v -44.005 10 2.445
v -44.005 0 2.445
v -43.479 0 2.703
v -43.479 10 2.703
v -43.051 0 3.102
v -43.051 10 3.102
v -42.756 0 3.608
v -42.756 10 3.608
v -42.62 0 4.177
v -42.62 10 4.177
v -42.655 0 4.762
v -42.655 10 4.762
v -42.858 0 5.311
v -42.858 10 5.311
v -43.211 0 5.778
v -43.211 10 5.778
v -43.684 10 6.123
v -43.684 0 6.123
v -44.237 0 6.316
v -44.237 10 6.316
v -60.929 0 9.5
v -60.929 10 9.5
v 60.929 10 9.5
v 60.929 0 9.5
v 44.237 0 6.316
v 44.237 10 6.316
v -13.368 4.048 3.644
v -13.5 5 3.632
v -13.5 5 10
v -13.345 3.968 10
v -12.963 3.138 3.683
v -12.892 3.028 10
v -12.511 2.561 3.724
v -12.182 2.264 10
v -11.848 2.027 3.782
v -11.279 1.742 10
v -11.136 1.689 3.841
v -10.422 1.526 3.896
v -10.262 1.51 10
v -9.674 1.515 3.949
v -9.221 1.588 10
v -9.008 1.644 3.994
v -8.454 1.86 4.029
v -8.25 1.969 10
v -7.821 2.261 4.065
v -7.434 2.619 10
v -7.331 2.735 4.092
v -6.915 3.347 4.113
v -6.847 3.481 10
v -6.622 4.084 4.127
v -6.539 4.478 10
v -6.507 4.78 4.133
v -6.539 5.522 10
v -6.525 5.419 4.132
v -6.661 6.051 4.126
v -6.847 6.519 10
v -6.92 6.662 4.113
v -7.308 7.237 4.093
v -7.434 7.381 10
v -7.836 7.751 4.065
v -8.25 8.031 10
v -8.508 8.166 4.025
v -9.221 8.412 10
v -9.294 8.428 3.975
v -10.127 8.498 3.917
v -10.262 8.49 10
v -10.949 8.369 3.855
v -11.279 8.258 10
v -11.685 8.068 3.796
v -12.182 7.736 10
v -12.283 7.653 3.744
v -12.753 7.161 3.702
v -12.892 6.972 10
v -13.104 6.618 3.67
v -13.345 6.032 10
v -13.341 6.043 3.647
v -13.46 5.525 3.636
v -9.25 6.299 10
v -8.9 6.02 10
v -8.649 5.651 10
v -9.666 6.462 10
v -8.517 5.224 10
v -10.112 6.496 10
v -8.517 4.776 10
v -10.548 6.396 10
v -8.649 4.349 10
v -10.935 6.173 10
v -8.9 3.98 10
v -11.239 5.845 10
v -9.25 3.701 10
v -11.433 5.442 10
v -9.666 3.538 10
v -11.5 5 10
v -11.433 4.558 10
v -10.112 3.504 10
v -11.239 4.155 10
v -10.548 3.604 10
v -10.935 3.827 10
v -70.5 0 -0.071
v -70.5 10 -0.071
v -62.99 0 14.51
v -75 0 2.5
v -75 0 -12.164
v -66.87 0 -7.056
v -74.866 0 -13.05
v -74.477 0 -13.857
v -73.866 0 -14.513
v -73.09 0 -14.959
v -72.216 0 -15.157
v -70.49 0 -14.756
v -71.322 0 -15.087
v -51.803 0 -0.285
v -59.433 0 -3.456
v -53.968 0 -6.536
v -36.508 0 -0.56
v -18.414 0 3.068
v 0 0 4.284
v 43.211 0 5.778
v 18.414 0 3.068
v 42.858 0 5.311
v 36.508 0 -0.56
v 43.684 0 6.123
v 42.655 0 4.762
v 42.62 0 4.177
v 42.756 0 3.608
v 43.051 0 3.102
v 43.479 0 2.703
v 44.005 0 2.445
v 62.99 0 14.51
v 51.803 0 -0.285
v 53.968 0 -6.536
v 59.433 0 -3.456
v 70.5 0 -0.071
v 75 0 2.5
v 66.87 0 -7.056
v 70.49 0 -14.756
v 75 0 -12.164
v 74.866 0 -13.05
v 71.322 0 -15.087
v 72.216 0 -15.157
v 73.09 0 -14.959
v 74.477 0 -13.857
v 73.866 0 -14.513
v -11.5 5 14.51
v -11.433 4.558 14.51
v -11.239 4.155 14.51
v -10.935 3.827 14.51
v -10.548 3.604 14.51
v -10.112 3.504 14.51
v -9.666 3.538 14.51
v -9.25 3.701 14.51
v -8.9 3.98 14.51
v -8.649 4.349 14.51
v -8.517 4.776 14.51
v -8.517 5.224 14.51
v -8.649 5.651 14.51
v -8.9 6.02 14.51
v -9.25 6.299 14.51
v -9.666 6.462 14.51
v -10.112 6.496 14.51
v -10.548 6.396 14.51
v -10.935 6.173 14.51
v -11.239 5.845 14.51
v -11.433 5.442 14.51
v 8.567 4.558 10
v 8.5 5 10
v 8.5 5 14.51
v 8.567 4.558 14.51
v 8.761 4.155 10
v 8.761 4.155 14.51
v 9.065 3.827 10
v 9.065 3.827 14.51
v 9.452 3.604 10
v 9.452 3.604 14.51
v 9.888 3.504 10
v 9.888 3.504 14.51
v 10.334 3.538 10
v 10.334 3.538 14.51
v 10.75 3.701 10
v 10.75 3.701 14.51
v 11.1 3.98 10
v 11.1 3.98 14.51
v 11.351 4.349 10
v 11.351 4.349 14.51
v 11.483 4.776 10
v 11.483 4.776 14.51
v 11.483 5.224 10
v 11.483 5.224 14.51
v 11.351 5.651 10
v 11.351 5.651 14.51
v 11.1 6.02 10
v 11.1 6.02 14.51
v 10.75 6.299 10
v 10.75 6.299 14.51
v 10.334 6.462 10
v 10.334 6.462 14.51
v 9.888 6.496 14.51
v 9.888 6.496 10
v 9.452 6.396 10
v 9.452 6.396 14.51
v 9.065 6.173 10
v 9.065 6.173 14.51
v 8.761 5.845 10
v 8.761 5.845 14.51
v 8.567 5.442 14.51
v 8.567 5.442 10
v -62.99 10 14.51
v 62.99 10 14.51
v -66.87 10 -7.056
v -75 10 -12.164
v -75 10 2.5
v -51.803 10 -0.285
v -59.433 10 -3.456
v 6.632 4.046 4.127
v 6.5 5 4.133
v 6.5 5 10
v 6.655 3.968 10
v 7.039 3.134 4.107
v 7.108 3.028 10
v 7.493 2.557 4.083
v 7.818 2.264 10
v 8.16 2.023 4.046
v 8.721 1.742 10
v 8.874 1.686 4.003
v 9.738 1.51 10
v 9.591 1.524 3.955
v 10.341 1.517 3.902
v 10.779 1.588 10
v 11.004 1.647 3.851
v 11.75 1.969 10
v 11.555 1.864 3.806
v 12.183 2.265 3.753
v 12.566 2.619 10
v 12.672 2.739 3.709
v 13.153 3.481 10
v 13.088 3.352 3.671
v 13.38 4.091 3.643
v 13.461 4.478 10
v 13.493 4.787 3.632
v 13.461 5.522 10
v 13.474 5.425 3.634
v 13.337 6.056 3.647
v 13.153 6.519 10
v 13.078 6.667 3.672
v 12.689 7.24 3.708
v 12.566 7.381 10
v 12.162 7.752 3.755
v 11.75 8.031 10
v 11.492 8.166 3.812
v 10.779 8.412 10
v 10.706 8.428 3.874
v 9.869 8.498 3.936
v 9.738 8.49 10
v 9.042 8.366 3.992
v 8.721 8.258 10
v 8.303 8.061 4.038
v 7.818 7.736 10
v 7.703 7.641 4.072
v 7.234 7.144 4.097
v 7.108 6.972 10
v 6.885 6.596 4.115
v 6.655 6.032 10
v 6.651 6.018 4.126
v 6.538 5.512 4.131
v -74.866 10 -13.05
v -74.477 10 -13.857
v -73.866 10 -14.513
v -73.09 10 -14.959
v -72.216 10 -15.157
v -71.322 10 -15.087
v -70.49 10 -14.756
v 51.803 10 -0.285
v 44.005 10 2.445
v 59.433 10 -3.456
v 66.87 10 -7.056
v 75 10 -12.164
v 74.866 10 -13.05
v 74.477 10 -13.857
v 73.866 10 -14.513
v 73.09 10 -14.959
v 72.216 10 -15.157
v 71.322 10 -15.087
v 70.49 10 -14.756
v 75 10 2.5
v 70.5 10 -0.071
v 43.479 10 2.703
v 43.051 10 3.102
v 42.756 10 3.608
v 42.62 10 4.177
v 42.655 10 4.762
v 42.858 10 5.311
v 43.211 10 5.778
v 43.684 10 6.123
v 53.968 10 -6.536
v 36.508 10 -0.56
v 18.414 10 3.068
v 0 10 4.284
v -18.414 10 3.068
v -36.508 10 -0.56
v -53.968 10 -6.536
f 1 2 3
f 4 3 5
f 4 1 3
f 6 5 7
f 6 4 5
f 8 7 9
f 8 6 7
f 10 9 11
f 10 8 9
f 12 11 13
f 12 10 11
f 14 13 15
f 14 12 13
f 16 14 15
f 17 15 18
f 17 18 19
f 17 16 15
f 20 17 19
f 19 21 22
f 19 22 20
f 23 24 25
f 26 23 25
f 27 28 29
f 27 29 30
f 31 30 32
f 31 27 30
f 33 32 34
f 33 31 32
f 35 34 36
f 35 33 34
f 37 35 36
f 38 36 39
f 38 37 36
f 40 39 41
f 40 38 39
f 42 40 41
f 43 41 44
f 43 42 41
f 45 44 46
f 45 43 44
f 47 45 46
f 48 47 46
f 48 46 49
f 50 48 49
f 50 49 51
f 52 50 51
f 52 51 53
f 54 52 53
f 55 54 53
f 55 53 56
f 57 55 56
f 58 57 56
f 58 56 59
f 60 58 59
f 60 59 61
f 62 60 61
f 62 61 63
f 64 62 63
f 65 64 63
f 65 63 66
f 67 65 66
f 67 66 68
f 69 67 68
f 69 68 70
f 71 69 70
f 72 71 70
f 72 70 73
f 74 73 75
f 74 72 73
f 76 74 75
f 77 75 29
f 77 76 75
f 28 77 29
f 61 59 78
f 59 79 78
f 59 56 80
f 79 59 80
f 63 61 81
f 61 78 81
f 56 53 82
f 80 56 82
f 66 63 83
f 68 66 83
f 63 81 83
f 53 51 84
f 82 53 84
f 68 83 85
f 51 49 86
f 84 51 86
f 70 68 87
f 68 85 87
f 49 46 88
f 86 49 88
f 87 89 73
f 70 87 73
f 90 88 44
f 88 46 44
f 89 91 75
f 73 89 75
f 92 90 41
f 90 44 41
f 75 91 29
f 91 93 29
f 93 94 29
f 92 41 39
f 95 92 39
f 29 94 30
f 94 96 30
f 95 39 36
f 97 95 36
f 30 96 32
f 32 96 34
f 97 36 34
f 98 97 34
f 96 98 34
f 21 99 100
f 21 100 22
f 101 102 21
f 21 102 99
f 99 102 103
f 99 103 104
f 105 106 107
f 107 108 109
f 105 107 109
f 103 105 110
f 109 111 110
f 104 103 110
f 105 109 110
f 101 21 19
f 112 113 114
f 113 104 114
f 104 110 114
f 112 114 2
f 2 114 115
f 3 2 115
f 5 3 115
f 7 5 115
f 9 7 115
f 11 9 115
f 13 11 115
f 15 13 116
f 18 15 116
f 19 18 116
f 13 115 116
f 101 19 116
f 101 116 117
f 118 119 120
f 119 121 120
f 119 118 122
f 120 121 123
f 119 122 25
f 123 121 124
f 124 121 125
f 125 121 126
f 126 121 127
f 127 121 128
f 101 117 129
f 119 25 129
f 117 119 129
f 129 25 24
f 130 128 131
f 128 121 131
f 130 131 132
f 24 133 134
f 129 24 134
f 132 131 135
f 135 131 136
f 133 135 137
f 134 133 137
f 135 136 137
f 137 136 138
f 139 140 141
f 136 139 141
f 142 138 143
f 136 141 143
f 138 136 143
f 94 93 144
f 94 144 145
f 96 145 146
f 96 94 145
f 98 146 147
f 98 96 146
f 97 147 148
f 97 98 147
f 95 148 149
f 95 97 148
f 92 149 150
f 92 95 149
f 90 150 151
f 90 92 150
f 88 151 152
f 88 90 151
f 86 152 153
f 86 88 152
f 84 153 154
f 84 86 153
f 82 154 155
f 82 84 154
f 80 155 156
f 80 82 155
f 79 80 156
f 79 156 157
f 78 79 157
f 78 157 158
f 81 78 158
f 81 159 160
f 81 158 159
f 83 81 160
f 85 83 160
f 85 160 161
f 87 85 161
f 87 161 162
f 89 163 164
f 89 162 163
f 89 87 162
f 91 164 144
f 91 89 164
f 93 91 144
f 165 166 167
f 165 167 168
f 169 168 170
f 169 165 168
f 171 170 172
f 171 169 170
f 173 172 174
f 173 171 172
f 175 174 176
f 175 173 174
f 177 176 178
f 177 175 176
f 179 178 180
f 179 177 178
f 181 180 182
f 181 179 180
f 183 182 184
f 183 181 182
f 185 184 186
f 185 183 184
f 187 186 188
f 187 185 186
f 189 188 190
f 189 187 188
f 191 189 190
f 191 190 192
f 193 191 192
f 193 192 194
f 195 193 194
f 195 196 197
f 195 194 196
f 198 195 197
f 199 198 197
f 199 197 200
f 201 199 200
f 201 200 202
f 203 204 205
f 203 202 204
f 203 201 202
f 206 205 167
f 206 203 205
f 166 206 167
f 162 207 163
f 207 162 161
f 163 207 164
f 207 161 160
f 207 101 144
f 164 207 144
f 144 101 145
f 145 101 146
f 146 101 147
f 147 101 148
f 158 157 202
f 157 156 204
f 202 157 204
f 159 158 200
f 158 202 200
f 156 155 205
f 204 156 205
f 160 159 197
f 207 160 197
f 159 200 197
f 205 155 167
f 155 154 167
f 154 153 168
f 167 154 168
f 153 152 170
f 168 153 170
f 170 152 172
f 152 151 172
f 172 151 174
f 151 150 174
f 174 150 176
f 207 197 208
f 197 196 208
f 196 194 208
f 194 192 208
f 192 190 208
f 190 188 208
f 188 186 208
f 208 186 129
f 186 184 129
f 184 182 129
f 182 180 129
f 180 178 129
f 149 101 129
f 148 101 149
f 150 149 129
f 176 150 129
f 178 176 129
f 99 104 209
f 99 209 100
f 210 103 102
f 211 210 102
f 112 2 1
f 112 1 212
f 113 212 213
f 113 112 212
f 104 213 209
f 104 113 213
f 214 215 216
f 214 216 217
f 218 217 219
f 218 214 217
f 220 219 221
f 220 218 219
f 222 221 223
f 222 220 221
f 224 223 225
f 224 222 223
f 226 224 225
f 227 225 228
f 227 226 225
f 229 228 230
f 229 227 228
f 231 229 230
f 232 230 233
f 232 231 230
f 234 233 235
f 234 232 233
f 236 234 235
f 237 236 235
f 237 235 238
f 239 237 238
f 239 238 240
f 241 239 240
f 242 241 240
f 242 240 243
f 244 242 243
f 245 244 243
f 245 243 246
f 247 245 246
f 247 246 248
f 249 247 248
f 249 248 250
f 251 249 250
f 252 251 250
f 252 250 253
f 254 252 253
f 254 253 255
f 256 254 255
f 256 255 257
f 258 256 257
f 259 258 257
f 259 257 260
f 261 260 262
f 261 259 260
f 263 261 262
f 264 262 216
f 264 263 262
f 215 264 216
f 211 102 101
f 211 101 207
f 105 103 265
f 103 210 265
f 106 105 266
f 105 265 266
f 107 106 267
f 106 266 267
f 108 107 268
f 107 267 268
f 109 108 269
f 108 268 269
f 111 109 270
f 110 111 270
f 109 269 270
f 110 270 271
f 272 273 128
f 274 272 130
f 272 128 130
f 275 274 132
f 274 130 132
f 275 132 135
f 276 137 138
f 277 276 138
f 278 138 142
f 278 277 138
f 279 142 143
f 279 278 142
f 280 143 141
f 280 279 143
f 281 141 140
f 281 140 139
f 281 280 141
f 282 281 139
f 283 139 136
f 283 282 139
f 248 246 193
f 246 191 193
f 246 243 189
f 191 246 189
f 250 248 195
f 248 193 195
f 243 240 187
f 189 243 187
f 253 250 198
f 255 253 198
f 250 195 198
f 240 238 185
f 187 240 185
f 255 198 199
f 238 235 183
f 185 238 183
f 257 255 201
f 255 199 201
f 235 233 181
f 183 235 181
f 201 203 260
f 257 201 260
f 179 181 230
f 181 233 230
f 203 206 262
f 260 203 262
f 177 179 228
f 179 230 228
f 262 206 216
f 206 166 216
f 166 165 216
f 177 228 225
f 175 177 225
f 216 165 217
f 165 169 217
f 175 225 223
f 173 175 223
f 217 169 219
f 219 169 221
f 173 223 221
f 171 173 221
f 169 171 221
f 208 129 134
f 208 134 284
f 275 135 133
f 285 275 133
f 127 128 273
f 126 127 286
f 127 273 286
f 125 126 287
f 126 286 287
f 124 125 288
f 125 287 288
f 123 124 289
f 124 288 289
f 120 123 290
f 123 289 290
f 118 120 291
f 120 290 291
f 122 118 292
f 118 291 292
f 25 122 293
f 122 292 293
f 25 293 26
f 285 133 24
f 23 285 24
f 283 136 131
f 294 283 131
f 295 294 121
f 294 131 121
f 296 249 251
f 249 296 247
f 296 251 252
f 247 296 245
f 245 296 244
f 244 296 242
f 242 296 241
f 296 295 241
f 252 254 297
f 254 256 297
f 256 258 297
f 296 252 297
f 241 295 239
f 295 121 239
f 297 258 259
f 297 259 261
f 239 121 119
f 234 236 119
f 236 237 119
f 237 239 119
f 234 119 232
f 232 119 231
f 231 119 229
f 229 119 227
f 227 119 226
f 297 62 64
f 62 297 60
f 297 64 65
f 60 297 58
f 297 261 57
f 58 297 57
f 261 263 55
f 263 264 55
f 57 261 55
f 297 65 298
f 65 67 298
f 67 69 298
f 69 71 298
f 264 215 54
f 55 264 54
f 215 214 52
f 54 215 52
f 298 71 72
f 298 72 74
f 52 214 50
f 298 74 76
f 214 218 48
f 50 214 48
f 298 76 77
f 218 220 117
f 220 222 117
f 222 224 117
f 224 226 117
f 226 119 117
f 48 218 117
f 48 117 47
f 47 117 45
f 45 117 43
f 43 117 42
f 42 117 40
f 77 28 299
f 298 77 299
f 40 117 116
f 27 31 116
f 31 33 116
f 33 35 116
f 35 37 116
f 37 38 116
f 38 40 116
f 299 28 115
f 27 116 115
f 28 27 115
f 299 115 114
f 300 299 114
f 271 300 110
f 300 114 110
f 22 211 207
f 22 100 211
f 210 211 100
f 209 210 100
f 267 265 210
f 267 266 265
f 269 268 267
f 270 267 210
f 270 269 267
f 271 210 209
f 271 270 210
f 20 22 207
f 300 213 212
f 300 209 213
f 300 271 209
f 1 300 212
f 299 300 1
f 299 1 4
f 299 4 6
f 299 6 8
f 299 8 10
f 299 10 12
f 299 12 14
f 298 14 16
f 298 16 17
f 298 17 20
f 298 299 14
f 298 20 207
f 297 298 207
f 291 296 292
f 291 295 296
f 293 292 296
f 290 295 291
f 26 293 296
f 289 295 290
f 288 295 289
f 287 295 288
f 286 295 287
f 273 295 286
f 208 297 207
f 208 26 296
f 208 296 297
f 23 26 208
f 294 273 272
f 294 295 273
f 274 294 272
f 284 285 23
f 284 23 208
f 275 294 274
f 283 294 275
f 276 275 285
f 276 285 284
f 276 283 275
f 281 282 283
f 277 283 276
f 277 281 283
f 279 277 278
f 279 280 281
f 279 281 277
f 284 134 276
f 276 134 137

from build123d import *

# Parameters (mm, degrees)
EXTRUDE_1_DEPTH     = 10
CHAMFER_1_SIZE      = 15
FILLET_1_R          = 3
SKETCH_2_R          = 1.5
CUT_EXTRUDE_2_DEPTH = 78.661122835
SKETCH_4_R          = 3.5
CUT_EXTRUDE_3_DEPTH = 10
CUT_EXTRUDE_4_DEPTH = 78.661122848
FILLET_2_R          = 2
SKETCH_6_W          = 150
SKETCH_6_H          = 5.98
CUT_EXTRUDE_5_DEPTH = 78.661122848


with BuildPart() as part:
    # 草图1 → 凸台-拉伸1 (new body)
    with BuildSketch(Plane(origin=(0, 0, 0), x_dir=(1, 0, 0), z_dir=(0, 1, 0))):
        with BuildLine():
            Line((-75, -17.5), (75, -17.5))
            Line((75, -17.5), (75, 17.5))
            ThreePointArc((75, 17.5), (0, -4.284095825), (-75, 17.5))
            Line((-75, 17.5), (-75, -17.5))
        make_face()
    extrude(amount=EXTRUDE_1_DEPTH)

    # 倒角1
    chamfer_1_edges = [part.edges().sort_by_distance(p)[0] for p in [
        (75, 5, 17.5),
        (-75, 5, 17.5),
    ]]
    chamfer(chamfer_1_edges, length=CHAMFER_1_SIZE)

    # 圆角1
    fillet_1_edges = [part.edges().sort_by_distance(p)[0] for p in [
        (75, 5, -17.5),
        (-75, 5, -17.5),
    ]]
    fillet(fillet_1_edges, radius=FILLET_1_R)

    # 草图2 → 切除-拉伸2 (cut, through all)
    with BuildSketch(Plane.XY):
        with Locations(Location((10, 5, 0), (0, 0, 180))):
            Circle(SKETCH_2_R)
        with Locations(Location((-10, 5, 0), (0, 0, 180))):
            Circle(SKETCH_2_R)
    extrude(amount=CUT_EXTRUDE_2_DEPTH, mode=Mode.SUBTRACT)

    # 草图4 → 切除-拉伸3 (cut)
    with BuildSketch(Plane.XY):
        with Locations(Location((10, 5, 0), (0, 0, 180))):
            Circle(SKETCH_4_R)
        with Locations(Location((-10, 5, 0), (0, 0, 180))):
            Circle(SKETCH_4_R)
    extrude(amount=CUT_EXTRUDE_3_DEPTH, mode=Mode.SUBTRACT)

    # 草图5 → 切除-拉伸4 (cut, through all)
    with BuildSketch(Plane.XZ):
        with BuildLine():
            ThreePointArc((-36, 4.744054532), (-51.772161826, -0.273505866), (-66.86977855, -7.055759932))
            Line((-66.86977855, -7.055759932), (-70.5, -0.071067812))
            Line((-70.5, -0.071067812), (-60.928932188, 9.5))
            Line((-60.928932188, 9.5), (-36, 4.744054532))
        make_face()
        with BuildLine():
            Line((60.928932188, 9.5), (36, 4.744054532))
            ThreePointArc((36, 4.744054532), (51.772161826, -0.273505866), (66.86977855, -7.055759932))
            Line((66.86977855, -7.055759932), (70.5, -0.071067812))
            Line((70.5, -0.071067812), (60.928932188, 9.5))
        make_face()
    extrude(amount=-CUT_EXTRUDE_4_DEPTH, mode=Mode.SUBTRACT)

    # 圆角2
    fillet_2_edges = [part.edges().sort_by_distance(p)[0] for p in [
        (-36, 5, 4.744054532),
        (36, 5, 4.744054532),
    ]]
    fillet(fillet_2_edges, radius=FILLET_2_R)

    # 草图6 → 切除-拉伸5 (cut, through all)
    with BuildSketch(Plane.XZ):
        with Locations((0, 17.5)):
            Rectangle(SKETCH_6_W, SKETCH_6_H)
    extrude(amount=-CUT_EXTRUDE_5_DEPTH, mode=Mode.SUBTRACT)


solid = part.part
